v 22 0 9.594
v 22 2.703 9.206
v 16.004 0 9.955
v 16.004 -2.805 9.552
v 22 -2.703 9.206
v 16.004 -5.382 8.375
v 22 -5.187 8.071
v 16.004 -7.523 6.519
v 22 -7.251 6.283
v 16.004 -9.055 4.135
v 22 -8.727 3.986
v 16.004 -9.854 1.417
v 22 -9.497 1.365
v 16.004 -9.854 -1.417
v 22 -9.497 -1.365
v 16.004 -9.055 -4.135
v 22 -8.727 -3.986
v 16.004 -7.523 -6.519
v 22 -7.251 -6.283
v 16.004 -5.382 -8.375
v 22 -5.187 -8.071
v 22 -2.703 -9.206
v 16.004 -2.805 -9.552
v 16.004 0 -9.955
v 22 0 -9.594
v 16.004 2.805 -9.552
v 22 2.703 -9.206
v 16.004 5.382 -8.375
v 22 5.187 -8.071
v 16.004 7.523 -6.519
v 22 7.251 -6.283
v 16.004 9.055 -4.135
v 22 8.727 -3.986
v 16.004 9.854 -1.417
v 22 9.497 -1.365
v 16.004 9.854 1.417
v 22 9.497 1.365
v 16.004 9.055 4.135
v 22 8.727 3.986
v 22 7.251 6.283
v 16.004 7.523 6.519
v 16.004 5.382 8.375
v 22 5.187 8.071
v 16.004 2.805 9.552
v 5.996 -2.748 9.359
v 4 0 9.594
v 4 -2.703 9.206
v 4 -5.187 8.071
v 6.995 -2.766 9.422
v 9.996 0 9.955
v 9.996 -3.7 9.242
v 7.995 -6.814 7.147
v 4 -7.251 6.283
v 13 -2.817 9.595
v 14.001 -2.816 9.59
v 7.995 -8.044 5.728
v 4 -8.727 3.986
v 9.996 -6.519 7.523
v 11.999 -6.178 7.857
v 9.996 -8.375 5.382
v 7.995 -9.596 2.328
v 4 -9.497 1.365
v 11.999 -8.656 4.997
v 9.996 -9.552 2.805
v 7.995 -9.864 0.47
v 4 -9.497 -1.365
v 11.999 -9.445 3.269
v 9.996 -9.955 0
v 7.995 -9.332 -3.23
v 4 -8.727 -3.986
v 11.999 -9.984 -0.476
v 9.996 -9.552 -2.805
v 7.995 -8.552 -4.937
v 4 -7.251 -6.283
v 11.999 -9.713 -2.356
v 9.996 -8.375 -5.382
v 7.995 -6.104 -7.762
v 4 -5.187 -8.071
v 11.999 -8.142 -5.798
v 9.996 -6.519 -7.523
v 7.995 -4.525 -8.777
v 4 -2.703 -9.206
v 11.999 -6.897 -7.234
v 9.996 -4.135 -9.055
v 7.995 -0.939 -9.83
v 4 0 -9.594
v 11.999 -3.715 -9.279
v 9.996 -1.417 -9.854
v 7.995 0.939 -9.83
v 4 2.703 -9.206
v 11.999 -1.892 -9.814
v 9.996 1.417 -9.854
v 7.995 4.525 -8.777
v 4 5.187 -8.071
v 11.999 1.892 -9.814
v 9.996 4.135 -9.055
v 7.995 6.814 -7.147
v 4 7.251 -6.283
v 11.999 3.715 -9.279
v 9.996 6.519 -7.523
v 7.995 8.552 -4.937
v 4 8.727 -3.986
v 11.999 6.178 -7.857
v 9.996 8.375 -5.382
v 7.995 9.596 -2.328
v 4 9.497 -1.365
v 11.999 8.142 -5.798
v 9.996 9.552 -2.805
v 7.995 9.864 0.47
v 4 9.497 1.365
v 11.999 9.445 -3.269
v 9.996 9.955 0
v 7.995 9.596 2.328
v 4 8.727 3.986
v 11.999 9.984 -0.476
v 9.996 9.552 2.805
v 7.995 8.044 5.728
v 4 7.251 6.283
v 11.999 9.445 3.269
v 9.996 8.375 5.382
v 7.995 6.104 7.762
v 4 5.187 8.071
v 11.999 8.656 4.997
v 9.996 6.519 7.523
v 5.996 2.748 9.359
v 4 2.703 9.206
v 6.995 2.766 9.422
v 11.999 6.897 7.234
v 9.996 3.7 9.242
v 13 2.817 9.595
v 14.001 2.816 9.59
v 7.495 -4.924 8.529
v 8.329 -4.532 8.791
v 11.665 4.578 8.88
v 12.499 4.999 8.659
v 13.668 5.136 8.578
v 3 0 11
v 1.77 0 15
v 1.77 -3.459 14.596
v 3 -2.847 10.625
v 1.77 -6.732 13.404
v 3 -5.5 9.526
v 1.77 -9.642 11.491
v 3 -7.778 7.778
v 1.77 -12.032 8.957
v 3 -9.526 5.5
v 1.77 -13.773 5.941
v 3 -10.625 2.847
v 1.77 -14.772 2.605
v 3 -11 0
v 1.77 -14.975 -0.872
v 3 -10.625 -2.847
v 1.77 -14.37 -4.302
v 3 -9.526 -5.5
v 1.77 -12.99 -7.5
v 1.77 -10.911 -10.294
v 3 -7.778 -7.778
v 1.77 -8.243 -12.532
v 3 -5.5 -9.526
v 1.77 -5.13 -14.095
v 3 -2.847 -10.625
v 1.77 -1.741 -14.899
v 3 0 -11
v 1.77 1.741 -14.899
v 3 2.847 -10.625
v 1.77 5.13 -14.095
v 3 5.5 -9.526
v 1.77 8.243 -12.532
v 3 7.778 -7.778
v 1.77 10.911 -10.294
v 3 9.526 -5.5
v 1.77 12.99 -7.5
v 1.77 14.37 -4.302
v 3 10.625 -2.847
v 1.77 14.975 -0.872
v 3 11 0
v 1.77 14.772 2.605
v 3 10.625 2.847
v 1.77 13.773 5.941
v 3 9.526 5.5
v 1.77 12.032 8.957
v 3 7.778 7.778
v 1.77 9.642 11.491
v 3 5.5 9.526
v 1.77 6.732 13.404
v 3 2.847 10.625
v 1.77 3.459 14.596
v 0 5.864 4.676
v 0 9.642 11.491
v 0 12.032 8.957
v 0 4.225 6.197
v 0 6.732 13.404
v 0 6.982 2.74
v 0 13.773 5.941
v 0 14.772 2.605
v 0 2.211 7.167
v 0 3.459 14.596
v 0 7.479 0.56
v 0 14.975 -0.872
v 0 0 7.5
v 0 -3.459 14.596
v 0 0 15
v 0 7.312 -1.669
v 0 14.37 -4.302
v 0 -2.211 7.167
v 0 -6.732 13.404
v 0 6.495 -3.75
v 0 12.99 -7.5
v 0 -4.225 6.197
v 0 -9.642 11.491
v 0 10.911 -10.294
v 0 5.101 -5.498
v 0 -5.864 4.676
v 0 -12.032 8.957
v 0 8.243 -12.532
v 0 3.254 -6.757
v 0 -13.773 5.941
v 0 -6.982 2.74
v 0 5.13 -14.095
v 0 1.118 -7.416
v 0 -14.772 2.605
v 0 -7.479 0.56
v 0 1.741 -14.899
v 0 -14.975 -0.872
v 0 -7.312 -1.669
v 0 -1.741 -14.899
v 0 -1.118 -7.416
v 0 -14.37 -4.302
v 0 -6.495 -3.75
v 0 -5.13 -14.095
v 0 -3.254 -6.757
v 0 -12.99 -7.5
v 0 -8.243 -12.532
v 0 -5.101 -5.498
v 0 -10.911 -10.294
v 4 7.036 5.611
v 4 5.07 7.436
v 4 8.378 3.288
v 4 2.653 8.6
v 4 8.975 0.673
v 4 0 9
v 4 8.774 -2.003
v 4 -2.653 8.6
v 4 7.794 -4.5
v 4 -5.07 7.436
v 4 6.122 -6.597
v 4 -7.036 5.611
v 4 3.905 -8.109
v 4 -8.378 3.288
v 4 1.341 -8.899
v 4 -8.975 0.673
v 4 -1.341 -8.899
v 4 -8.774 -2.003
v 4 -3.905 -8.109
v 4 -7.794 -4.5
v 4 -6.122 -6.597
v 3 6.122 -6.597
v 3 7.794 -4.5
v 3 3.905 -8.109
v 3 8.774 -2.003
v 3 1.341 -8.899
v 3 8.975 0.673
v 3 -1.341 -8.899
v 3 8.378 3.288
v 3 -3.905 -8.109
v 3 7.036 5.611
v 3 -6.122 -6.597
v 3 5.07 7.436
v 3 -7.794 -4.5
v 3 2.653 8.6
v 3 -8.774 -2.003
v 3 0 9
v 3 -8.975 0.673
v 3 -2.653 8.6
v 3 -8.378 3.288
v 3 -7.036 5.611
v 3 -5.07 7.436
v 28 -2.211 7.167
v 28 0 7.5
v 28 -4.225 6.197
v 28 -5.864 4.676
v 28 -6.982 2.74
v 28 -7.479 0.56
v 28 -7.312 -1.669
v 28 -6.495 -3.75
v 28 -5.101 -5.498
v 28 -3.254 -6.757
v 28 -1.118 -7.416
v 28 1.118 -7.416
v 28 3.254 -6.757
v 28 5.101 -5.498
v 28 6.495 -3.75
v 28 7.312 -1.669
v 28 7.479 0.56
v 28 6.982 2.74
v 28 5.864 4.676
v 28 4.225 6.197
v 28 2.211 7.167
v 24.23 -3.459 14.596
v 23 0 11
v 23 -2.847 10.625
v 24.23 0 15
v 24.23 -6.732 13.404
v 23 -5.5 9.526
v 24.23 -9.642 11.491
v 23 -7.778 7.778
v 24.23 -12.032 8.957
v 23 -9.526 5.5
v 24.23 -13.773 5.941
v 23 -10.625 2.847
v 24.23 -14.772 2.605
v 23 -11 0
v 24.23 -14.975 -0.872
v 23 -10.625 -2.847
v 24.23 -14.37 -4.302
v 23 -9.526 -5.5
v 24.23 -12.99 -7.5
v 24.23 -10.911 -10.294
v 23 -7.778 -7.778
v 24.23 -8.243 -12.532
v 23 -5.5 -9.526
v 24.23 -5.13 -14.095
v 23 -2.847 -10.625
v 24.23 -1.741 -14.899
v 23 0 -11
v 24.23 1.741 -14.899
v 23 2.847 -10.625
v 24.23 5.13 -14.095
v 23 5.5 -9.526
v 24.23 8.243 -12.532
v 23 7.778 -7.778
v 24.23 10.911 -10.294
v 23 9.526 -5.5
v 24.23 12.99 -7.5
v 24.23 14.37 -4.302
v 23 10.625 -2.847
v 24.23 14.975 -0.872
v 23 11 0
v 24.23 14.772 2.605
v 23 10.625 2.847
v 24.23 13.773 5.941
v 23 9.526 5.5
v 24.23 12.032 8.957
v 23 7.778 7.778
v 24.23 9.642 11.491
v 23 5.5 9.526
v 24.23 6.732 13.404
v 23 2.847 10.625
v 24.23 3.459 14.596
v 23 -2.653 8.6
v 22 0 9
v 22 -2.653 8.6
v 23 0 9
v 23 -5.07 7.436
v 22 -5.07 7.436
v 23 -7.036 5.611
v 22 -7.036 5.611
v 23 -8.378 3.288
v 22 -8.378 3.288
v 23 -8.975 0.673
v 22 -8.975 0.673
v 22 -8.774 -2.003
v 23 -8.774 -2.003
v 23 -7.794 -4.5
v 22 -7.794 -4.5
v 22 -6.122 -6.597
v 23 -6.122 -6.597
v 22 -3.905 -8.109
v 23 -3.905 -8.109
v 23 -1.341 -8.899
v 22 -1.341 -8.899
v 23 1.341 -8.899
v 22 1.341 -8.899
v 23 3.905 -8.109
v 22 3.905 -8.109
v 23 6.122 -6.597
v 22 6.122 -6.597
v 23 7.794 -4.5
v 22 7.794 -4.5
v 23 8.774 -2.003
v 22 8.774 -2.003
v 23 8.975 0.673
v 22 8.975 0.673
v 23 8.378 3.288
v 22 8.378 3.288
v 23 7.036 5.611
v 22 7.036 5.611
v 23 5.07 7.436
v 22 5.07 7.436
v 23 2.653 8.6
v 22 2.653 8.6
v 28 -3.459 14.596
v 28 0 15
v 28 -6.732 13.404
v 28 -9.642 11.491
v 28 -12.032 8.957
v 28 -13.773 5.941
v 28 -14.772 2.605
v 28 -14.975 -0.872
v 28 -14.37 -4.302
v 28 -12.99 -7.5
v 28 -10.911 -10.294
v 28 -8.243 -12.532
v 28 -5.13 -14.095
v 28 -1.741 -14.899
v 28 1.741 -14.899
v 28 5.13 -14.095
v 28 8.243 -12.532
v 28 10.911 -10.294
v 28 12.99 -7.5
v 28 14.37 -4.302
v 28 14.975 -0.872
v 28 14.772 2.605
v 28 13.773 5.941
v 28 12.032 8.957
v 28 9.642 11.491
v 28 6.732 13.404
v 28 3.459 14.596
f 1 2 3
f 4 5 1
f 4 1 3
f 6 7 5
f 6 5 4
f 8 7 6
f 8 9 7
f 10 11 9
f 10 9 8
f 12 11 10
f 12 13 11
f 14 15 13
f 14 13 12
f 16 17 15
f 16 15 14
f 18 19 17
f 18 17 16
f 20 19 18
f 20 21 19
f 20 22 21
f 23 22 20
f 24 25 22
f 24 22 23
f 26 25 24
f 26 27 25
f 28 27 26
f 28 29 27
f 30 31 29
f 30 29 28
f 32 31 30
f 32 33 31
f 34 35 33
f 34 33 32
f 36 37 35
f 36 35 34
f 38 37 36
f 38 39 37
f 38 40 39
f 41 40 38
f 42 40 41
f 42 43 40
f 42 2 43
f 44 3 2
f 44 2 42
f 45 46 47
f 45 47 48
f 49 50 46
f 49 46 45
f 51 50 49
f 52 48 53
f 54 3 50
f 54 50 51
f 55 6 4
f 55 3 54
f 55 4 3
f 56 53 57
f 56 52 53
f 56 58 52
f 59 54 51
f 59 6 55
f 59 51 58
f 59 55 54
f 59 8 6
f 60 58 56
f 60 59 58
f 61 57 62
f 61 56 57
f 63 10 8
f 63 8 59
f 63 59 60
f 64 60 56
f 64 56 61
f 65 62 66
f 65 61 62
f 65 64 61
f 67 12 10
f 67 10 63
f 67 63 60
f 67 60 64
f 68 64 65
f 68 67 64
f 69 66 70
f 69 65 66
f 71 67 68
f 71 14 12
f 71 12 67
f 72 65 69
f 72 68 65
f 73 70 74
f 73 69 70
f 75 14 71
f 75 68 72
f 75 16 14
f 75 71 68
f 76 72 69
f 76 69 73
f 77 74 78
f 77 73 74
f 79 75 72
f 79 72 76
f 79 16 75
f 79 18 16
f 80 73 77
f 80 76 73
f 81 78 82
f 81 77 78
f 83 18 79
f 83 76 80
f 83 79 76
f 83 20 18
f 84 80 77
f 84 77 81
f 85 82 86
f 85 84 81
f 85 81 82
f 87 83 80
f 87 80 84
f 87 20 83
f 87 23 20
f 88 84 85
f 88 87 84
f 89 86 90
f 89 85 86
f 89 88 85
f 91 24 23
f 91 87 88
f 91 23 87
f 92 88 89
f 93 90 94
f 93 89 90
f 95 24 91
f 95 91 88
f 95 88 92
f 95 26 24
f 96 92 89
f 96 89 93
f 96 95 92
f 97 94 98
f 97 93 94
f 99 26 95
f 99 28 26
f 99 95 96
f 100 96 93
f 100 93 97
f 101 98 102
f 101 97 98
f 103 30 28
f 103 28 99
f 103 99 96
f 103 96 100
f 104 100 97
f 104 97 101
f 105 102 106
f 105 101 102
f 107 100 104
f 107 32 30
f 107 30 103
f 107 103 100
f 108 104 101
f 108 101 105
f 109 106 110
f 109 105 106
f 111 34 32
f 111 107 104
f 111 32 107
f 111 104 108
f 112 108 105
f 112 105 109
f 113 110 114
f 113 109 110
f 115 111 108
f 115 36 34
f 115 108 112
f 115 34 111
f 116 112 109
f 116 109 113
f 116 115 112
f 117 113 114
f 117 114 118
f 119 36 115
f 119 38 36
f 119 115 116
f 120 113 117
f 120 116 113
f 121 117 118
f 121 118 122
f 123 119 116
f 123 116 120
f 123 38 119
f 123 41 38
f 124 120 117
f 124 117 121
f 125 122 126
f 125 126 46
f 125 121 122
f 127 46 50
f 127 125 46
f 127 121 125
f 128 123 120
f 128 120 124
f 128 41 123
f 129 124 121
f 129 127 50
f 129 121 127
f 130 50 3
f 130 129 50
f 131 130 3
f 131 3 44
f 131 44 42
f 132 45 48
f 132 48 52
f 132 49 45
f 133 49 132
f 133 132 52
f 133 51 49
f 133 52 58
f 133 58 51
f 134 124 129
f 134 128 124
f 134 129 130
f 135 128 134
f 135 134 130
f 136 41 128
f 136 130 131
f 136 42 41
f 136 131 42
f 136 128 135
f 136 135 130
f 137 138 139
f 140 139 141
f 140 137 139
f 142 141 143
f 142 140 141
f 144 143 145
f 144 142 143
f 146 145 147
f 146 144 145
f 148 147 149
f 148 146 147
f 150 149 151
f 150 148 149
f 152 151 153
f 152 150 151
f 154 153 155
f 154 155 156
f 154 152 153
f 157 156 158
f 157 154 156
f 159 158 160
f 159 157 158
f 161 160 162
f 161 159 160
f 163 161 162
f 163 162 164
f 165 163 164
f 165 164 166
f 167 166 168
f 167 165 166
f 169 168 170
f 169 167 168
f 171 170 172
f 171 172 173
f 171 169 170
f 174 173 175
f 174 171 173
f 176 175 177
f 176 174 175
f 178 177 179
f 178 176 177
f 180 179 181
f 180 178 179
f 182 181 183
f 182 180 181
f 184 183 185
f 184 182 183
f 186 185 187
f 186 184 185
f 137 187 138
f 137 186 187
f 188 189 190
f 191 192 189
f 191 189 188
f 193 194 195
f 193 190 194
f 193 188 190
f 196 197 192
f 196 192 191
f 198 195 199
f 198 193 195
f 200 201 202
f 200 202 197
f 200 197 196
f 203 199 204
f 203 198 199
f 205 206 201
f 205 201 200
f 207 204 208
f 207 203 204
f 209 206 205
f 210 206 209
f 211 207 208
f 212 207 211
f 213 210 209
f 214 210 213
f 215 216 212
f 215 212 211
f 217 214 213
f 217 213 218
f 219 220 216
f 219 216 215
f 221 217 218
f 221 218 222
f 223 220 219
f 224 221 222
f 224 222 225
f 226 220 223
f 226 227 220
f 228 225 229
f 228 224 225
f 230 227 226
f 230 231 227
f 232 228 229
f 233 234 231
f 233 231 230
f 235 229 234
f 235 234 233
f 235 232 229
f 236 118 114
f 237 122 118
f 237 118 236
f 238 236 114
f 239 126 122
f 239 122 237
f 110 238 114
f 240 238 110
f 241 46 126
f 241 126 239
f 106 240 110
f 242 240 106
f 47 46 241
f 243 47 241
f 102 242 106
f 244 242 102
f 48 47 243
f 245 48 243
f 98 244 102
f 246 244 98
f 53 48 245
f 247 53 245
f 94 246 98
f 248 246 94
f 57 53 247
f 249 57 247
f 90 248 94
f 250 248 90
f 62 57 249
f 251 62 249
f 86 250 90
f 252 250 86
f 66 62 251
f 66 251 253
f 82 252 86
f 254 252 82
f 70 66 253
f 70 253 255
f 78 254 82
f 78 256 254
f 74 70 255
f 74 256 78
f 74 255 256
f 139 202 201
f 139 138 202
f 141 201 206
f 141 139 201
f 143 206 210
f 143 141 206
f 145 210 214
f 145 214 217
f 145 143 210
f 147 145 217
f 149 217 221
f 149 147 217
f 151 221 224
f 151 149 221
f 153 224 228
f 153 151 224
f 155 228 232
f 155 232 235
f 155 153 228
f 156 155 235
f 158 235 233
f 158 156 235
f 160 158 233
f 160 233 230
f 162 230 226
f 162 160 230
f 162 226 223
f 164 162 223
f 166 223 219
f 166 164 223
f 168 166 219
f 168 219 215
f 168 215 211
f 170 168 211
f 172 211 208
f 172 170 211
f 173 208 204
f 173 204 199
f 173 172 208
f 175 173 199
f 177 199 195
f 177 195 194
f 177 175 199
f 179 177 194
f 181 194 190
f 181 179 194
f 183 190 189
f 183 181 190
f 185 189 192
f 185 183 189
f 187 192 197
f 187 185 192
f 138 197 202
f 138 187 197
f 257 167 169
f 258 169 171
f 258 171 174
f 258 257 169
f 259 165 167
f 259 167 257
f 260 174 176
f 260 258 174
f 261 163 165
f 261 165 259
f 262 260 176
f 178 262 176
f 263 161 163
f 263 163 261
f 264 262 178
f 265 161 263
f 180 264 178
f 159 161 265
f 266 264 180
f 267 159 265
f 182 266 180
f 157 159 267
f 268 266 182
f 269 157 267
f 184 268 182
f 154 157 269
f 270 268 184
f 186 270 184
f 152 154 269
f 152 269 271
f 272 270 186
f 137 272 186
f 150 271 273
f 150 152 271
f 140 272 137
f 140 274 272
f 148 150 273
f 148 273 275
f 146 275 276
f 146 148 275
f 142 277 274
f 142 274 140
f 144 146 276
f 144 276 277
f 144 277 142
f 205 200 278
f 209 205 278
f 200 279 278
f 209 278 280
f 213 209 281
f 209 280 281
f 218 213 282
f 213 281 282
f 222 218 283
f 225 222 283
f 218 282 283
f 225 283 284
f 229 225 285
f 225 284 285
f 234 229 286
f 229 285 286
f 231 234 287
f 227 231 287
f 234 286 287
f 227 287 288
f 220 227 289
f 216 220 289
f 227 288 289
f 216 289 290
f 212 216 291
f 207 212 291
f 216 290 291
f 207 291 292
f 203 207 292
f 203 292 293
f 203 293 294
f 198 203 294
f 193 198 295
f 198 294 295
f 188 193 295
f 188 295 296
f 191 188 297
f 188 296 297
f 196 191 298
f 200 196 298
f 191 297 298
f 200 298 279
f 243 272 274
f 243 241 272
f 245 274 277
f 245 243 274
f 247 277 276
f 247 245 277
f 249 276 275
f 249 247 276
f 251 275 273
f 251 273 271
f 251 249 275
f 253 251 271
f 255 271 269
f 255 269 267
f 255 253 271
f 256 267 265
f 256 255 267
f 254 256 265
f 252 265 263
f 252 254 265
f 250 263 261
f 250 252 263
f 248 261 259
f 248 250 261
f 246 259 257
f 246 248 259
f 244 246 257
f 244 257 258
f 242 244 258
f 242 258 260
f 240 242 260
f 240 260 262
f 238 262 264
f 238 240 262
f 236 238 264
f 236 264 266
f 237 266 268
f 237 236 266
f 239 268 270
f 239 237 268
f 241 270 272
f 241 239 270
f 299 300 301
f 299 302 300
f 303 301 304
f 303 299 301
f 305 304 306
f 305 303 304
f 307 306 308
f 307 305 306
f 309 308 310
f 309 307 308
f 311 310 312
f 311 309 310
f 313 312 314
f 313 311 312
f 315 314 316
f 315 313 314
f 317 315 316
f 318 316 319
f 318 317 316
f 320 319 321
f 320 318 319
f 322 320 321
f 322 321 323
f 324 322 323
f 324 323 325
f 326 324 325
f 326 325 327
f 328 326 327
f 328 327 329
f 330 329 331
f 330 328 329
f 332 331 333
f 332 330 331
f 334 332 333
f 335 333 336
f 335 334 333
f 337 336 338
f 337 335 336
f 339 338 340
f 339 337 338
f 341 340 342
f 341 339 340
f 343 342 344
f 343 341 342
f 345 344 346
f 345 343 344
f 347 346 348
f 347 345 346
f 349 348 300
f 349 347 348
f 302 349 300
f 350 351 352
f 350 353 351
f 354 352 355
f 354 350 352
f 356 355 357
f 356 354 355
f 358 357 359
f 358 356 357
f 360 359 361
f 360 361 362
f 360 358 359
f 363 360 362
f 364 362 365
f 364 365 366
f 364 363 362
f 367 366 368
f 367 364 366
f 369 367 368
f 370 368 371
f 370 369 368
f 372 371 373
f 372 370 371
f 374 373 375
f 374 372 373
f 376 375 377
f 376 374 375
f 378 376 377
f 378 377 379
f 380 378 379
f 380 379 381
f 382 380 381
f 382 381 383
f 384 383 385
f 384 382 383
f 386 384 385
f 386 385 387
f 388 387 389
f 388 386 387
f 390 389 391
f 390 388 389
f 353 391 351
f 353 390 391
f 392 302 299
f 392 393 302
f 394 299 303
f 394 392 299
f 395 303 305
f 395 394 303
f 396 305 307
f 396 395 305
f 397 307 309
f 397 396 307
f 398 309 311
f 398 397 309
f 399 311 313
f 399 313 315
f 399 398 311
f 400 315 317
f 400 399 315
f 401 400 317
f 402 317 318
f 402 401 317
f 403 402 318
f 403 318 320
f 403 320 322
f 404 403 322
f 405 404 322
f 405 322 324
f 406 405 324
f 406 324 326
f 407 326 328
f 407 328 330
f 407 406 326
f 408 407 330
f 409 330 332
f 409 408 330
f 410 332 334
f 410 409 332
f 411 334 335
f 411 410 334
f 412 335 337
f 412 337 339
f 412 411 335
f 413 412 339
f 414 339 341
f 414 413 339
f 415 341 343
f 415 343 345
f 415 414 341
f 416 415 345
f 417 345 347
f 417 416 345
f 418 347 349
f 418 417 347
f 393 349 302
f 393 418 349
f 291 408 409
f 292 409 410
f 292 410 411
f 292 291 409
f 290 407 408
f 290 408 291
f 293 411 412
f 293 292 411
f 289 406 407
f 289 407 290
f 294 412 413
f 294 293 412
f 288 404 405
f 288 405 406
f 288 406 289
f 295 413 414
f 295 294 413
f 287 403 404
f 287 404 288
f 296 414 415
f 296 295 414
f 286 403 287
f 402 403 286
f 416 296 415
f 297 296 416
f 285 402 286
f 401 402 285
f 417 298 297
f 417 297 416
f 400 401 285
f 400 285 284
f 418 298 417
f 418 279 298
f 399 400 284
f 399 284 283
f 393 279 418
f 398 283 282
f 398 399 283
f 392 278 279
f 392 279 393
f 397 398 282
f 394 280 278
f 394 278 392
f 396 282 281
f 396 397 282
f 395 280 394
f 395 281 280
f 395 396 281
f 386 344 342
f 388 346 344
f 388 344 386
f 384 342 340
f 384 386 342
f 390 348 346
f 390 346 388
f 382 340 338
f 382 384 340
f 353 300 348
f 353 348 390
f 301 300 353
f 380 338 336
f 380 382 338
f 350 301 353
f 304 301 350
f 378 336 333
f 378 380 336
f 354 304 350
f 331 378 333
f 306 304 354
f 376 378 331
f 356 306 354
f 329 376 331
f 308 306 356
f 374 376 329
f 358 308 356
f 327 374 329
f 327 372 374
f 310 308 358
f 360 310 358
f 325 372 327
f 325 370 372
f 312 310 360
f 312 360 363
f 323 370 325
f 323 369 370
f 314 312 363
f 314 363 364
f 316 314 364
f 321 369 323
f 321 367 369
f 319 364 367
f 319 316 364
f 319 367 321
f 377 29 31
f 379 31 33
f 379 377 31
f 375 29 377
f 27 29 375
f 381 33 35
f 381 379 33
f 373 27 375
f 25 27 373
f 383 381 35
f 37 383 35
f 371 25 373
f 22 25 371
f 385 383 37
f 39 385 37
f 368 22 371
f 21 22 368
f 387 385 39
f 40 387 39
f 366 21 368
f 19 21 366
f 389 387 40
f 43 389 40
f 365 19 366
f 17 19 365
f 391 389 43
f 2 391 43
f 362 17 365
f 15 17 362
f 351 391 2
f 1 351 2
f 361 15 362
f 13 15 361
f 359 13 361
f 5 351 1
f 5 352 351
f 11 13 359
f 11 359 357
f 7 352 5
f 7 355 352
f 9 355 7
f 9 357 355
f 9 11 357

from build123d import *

# Parameters (mm, degrees)
SKETCH2_W = 28
SKETCH2_H = 7.5


with BuildPart() as part:
    # Sketch1 → Revolve1 (revolve)
    with BuildSketch(Plane.XY, mode=Mode.PRIVATE) as revolve1_sk:
        with BuildLine():
            Line((0, 0), (0, 15))
            Line((0, 15), (1.77, 15))
            Line((1.77, 15), (3, 11))
            Line((3, 11), (3, 9))
            Line((3, 9), (4, 9))
            Line((4, 9), (4, 9.594176537))
            ThreePointArc((4, 9.594176537), (13, 10), (22, 9.594176537))
            Line((22, 9.594176537), (22, 9))
            Line((22, 9), (23, 9))
            Line((23, 9), (23, 11))
            Line((23, 11), (24.23, 15))
            Line((24.23, 15), (28, 15))
            Line((28, 15), (28, 0))
            Line((28, 0), (0, 0))
        make_face()
    revolve(revolve1_sk.sketch.rotate(Axis((-3.443803602, 0, 0), (1, 0, 0)), 90), axis=Axis((-3.443803602, 0, 0), (1, 0, 0)))

    # Sketch2 → Cut-Revolve1 (revolve, cut)
    with BuildSketch(Plane.XY, mode=Mode.PRIVATE) as cut_revolve1_sk:
        with Locations((14, 3.75)):
            Rectangle(SKETCH2_W, SKETCH2_H)
    revolve(cut_revolve1_sk.sketch.rotate(Axis((-3.383783784, 0, 0), (1, 0, 0)), 90), axis=Axis((-3.383783784, 0, 0), (1, 0, 0)), mode=Mode.SUBTRACT)


solid = part.part
